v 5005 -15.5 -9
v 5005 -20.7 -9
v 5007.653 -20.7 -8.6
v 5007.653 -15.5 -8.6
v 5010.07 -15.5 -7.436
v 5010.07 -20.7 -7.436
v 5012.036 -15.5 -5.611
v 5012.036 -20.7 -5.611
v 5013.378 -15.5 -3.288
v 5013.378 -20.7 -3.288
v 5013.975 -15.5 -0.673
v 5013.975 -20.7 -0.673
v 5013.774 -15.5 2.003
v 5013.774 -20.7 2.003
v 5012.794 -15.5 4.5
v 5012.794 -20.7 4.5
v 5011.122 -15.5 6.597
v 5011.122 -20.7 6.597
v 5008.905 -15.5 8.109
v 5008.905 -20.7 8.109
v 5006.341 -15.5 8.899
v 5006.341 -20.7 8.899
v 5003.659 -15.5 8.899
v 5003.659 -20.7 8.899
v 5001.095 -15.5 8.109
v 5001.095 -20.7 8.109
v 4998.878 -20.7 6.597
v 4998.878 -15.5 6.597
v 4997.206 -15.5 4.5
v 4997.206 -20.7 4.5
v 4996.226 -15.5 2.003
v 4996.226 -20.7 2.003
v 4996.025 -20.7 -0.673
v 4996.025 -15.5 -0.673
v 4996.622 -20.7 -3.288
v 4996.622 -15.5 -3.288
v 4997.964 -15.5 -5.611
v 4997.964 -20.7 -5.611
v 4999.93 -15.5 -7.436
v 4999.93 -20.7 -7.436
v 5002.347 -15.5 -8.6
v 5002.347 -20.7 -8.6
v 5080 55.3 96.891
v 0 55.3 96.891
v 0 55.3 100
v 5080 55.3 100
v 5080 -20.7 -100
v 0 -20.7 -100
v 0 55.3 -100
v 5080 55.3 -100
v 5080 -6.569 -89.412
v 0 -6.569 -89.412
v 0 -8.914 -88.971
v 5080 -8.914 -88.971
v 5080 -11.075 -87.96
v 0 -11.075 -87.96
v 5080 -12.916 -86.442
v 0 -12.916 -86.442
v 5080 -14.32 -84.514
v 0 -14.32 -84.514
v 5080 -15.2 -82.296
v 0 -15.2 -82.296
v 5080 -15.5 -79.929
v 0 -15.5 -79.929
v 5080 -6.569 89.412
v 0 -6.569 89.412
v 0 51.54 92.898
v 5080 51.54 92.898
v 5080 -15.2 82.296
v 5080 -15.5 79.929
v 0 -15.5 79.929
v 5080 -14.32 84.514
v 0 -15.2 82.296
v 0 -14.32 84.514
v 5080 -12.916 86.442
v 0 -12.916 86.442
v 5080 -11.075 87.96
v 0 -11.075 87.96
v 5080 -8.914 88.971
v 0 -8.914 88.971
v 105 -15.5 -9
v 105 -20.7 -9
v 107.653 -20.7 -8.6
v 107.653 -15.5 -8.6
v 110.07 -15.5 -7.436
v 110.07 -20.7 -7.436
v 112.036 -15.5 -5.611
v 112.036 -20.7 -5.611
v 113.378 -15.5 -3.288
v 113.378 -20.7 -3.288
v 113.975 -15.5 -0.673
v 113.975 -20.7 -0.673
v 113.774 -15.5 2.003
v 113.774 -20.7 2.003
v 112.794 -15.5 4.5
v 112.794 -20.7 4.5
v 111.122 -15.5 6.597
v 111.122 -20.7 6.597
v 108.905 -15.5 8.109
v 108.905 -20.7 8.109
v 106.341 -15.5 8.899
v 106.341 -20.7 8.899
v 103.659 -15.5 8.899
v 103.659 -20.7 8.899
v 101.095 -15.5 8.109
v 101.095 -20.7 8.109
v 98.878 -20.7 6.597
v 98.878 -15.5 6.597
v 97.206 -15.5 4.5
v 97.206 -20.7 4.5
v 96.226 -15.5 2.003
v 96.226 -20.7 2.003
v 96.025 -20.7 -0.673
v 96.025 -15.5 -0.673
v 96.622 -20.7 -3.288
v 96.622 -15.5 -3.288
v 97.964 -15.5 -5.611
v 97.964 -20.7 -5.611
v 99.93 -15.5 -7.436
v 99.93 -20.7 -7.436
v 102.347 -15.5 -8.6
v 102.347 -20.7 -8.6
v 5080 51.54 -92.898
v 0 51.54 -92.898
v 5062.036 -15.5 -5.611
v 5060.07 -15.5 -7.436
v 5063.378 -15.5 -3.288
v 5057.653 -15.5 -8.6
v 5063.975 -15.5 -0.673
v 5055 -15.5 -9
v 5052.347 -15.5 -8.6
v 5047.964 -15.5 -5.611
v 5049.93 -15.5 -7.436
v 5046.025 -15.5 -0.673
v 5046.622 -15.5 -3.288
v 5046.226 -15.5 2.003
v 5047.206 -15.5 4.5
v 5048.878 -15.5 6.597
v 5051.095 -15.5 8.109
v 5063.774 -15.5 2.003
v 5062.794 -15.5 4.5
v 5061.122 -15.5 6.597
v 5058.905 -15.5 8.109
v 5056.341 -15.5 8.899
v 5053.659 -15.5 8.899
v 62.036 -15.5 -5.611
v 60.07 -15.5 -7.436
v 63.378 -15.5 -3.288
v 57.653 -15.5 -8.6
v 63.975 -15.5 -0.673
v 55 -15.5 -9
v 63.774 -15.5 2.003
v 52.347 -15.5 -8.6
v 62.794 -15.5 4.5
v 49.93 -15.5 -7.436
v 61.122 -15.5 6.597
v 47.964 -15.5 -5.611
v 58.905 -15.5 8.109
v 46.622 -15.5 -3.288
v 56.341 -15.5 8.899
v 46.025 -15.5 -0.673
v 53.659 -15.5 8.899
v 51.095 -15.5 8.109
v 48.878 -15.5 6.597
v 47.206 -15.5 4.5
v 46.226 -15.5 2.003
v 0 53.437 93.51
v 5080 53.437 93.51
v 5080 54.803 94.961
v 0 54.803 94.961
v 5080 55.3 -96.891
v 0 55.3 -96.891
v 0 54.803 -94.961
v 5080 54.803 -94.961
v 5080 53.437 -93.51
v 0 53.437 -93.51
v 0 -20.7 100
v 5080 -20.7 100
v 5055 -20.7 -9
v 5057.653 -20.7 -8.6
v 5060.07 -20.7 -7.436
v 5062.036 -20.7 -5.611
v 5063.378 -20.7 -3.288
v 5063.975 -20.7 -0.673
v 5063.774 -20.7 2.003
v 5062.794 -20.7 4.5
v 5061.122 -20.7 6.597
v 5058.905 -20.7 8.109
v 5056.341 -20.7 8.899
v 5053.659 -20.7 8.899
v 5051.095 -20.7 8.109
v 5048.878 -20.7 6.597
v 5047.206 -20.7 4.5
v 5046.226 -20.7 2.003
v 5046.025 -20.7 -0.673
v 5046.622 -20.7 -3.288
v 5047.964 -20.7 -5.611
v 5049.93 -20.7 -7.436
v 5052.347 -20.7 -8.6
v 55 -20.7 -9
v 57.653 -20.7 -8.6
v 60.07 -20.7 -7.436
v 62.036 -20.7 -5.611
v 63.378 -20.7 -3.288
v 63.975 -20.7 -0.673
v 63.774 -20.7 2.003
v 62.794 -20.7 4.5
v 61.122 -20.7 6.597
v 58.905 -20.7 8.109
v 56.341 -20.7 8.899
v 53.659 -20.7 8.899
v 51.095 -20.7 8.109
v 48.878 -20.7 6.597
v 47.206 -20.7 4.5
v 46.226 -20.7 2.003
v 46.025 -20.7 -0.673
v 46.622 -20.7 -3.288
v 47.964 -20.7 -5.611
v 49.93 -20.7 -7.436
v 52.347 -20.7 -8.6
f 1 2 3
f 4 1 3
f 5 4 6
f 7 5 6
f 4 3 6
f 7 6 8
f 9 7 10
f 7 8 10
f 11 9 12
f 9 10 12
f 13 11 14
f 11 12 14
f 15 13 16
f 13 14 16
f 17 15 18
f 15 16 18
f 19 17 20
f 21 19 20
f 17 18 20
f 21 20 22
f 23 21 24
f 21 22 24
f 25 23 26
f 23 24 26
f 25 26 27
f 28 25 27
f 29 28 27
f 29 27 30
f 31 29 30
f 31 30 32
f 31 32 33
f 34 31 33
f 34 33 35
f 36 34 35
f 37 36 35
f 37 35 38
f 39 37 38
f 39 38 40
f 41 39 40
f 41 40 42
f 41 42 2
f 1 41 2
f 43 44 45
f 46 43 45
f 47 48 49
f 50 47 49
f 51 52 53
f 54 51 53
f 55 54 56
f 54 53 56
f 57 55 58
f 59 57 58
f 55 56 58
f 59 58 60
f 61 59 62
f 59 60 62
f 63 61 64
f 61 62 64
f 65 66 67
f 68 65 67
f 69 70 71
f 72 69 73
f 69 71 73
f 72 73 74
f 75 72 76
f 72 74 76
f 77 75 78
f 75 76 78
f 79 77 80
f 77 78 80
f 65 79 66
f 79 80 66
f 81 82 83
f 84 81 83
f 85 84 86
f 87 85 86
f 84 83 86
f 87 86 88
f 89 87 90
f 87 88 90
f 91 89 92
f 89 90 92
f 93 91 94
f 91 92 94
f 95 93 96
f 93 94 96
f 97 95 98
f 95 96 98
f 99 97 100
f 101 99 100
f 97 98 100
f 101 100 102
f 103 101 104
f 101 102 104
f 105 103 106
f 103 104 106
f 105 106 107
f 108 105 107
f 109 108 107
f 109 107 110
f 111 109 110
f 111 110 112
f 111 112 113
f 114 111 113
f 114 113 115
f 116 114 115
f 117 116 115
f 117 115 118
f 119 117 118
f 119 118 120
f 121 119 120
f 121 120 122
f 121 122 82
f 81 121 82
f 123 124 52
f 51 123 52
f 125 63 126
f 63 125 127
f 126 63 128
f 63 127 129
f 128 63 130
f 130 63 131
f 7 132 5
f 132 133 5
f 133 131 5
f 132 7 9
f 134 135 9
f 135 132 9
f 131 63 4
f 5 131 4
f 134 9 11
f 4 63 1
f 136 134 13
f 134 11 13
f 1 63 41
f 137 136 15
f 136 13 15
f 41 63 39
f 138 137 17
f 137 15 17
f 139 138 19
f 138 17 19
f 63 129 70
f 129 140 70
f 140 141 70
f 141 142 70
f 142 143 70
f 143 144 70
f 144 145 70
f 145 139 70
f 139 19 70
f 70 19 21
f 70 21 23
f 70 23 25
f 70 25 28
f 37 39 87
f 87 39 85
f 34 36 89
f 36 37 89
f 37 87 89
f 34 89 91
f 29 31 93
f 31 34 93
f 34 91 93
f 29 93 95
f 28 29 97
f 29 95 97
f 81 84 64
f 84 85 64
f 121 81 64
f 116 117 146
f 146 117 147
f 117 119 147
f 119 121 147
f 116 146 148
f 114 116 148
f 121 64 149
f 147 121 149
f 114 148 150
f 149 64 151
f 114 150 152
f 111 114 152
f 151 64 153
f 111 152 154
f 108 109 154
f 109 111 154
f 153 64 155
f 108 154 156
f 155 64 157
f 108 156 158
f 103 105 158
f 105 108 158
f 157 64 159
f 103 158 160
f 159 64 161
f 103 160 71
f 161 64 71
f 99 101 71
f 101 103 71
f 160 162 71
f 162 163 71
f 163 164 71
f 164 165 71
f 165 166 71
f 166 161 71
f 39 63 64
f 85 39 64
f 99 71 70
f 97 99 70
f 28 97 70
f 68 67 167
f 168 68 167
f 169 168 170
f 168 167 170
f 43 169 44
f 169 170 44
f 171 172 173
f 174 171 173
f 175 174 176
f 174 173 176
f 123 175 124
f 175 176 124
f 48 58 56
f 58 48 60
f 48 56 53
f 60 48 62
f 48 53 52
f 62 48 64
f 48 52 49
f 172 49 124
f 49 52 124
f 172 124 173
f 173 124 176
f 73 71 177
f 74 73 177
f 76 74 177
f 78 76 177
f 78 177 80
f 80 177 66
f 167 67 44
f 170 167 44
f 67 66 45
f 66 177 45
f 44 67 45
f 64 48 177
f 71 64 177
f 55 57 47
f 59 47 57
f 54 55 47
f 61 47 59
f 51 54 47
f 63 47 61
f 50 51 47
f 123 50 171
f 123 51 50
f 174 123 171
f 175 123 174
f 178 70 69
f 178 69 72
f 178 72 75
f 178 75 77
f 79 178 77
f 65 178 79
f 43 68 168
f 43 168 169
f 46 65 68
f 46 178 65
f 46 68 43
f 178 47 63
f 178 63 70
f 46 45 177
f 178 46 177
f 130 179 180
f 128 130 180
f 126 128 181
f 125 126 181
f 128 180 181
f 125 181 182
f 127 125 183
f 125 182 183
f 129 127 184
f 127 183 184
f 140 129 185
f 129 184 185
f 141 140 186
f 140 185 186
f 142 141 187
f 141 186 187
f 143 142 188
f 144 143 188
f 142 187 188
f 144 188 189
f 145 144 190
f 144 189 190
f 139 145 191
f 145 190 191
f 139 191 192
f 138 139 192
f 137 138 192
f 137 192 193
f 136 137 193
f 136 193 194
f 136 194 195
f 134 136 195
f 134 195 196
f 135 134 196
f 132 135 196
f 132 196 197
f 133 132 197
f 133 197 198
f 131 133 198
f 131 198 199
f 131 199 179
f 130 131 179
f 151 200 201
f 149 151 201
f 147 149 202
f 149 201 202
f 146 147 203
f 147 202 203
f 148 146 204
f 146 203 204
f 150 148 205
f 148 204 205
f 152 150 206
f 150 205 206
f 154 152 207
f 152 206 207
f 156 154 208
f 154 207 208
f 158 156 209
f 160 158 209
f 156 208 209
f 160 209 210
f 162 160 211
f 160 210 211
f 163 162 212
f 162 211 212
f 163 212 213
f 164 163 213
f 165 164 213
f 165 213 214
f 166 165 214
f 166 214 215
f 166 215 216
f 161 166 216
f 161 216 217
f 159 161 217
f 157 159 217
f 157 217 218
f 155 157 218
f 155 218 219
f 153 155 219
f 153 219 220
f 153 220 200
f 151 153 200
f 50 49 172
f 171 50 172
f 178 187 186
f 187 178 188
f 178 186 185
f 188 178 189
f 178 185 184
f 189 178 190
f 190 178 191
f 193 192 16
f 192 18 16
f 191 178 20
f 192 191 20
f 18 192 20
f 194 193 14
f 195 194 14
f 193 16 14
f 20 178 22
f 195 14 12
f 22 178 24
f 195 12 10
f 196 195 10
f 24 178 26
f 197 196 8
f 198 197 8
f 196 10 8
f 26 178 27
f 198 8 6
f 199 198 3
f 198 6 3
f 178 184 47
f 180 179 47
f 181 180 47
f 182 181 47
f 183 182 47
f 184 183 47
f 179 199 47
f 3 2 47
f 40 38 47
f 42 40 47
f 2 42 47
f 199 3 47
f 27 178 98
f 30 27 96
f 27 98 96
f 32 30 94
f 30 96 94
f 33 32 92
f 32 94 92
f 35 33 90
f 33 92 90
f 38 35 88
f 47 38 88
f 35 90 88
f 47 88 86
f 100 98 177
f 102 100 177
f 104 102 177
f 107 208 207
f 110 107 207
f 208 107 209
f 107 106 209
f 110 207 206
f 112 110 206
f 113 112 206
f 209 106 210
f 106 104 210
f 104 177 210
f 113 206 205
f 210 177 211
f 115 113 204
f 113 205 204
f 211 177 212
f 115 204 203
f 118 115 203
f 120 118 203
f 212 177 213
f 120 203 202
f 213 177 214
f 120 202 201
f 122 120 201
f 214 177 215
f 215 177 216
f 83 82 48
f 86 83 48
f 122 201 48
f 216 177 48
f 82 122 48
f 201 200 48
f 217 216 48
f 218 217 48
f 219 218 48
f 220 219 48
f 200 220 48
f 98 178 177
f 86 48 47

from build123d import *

# Parameters (mm, degrees)
MEMBER_8240_89_20_1_DEPTH = 5080
SKETCH_3_R                = 9
CUT_EXTRUDE_1_DEPTH       = 10


with BuildPart() as part:
    # Sketch1 → Member 8240-89 _ _ 20_1 (new body)
    with BuildSketch(Plane.YZ):
        with BuildLine():
            Line((-15.5, -79.928915362), (-15.5, 79.928915362))
            ThreePointArc((-15.5, 79.928915362), (-12.915753004, 86.442160359), (-6.568976762, 89.411861394))
            Line((-6.568976762, 89.411861394), (51.539569163, 92.89837415))
            ThreePointArc((51.539569163, 92.89837415), (54.211896002, 94.148774586), (55.3, 96.891193532))
            Line((55.3, 96.891193532), (55.3, 100))
            Line((55.3, 100), (-20.7, 100))
            Line((-20.7, 100), (-20.7, -100))
            Line((-20.7, -100), (55.3, -100))
            Line((55.3, -100), (55.3, -96.891193532))
            ThreePointArc((55.3, -96.891193532), (54.211896002, -94.148774586), (51.539569163, -92.89837415))
            Line((51.539569163, -92.89837415), (-6.568976762, -89.411861394))
            ThreePointArc((-6.568976762, -89.411861394), (-12.915753004, -86.442160359), (-15.5, -79.928915362))
        make_face()
    extrude(amount=MEMBER_8240_89_20_1_DEPTH)

    # Эскиз3 → Вырез-Вытянуть1 (cut)
    with BuildSketch(Plane.XZ.offset(20.7)):
        with Locations(Location((55, 0, 0), (0, 0, 270))):
            Circle(SKETCH_3_R)
        with Locations(Location((105, 0, 0), (0, 0, 270))):
            Circle(SKETCH_3_R)
        with Locations(Location((5005, 0, 0), (0, 0, 270))):
            Circle(SKETCH_3_R)
        with Locations(Location((5055, 0, 0), (0, 0, 270))):
            Circle(SKETCH_3_R)
    extrude(amount=-CUT_EXTRUDE_1_DEPTH, mode=Mode.SUBTRACT)


solid = part.part
